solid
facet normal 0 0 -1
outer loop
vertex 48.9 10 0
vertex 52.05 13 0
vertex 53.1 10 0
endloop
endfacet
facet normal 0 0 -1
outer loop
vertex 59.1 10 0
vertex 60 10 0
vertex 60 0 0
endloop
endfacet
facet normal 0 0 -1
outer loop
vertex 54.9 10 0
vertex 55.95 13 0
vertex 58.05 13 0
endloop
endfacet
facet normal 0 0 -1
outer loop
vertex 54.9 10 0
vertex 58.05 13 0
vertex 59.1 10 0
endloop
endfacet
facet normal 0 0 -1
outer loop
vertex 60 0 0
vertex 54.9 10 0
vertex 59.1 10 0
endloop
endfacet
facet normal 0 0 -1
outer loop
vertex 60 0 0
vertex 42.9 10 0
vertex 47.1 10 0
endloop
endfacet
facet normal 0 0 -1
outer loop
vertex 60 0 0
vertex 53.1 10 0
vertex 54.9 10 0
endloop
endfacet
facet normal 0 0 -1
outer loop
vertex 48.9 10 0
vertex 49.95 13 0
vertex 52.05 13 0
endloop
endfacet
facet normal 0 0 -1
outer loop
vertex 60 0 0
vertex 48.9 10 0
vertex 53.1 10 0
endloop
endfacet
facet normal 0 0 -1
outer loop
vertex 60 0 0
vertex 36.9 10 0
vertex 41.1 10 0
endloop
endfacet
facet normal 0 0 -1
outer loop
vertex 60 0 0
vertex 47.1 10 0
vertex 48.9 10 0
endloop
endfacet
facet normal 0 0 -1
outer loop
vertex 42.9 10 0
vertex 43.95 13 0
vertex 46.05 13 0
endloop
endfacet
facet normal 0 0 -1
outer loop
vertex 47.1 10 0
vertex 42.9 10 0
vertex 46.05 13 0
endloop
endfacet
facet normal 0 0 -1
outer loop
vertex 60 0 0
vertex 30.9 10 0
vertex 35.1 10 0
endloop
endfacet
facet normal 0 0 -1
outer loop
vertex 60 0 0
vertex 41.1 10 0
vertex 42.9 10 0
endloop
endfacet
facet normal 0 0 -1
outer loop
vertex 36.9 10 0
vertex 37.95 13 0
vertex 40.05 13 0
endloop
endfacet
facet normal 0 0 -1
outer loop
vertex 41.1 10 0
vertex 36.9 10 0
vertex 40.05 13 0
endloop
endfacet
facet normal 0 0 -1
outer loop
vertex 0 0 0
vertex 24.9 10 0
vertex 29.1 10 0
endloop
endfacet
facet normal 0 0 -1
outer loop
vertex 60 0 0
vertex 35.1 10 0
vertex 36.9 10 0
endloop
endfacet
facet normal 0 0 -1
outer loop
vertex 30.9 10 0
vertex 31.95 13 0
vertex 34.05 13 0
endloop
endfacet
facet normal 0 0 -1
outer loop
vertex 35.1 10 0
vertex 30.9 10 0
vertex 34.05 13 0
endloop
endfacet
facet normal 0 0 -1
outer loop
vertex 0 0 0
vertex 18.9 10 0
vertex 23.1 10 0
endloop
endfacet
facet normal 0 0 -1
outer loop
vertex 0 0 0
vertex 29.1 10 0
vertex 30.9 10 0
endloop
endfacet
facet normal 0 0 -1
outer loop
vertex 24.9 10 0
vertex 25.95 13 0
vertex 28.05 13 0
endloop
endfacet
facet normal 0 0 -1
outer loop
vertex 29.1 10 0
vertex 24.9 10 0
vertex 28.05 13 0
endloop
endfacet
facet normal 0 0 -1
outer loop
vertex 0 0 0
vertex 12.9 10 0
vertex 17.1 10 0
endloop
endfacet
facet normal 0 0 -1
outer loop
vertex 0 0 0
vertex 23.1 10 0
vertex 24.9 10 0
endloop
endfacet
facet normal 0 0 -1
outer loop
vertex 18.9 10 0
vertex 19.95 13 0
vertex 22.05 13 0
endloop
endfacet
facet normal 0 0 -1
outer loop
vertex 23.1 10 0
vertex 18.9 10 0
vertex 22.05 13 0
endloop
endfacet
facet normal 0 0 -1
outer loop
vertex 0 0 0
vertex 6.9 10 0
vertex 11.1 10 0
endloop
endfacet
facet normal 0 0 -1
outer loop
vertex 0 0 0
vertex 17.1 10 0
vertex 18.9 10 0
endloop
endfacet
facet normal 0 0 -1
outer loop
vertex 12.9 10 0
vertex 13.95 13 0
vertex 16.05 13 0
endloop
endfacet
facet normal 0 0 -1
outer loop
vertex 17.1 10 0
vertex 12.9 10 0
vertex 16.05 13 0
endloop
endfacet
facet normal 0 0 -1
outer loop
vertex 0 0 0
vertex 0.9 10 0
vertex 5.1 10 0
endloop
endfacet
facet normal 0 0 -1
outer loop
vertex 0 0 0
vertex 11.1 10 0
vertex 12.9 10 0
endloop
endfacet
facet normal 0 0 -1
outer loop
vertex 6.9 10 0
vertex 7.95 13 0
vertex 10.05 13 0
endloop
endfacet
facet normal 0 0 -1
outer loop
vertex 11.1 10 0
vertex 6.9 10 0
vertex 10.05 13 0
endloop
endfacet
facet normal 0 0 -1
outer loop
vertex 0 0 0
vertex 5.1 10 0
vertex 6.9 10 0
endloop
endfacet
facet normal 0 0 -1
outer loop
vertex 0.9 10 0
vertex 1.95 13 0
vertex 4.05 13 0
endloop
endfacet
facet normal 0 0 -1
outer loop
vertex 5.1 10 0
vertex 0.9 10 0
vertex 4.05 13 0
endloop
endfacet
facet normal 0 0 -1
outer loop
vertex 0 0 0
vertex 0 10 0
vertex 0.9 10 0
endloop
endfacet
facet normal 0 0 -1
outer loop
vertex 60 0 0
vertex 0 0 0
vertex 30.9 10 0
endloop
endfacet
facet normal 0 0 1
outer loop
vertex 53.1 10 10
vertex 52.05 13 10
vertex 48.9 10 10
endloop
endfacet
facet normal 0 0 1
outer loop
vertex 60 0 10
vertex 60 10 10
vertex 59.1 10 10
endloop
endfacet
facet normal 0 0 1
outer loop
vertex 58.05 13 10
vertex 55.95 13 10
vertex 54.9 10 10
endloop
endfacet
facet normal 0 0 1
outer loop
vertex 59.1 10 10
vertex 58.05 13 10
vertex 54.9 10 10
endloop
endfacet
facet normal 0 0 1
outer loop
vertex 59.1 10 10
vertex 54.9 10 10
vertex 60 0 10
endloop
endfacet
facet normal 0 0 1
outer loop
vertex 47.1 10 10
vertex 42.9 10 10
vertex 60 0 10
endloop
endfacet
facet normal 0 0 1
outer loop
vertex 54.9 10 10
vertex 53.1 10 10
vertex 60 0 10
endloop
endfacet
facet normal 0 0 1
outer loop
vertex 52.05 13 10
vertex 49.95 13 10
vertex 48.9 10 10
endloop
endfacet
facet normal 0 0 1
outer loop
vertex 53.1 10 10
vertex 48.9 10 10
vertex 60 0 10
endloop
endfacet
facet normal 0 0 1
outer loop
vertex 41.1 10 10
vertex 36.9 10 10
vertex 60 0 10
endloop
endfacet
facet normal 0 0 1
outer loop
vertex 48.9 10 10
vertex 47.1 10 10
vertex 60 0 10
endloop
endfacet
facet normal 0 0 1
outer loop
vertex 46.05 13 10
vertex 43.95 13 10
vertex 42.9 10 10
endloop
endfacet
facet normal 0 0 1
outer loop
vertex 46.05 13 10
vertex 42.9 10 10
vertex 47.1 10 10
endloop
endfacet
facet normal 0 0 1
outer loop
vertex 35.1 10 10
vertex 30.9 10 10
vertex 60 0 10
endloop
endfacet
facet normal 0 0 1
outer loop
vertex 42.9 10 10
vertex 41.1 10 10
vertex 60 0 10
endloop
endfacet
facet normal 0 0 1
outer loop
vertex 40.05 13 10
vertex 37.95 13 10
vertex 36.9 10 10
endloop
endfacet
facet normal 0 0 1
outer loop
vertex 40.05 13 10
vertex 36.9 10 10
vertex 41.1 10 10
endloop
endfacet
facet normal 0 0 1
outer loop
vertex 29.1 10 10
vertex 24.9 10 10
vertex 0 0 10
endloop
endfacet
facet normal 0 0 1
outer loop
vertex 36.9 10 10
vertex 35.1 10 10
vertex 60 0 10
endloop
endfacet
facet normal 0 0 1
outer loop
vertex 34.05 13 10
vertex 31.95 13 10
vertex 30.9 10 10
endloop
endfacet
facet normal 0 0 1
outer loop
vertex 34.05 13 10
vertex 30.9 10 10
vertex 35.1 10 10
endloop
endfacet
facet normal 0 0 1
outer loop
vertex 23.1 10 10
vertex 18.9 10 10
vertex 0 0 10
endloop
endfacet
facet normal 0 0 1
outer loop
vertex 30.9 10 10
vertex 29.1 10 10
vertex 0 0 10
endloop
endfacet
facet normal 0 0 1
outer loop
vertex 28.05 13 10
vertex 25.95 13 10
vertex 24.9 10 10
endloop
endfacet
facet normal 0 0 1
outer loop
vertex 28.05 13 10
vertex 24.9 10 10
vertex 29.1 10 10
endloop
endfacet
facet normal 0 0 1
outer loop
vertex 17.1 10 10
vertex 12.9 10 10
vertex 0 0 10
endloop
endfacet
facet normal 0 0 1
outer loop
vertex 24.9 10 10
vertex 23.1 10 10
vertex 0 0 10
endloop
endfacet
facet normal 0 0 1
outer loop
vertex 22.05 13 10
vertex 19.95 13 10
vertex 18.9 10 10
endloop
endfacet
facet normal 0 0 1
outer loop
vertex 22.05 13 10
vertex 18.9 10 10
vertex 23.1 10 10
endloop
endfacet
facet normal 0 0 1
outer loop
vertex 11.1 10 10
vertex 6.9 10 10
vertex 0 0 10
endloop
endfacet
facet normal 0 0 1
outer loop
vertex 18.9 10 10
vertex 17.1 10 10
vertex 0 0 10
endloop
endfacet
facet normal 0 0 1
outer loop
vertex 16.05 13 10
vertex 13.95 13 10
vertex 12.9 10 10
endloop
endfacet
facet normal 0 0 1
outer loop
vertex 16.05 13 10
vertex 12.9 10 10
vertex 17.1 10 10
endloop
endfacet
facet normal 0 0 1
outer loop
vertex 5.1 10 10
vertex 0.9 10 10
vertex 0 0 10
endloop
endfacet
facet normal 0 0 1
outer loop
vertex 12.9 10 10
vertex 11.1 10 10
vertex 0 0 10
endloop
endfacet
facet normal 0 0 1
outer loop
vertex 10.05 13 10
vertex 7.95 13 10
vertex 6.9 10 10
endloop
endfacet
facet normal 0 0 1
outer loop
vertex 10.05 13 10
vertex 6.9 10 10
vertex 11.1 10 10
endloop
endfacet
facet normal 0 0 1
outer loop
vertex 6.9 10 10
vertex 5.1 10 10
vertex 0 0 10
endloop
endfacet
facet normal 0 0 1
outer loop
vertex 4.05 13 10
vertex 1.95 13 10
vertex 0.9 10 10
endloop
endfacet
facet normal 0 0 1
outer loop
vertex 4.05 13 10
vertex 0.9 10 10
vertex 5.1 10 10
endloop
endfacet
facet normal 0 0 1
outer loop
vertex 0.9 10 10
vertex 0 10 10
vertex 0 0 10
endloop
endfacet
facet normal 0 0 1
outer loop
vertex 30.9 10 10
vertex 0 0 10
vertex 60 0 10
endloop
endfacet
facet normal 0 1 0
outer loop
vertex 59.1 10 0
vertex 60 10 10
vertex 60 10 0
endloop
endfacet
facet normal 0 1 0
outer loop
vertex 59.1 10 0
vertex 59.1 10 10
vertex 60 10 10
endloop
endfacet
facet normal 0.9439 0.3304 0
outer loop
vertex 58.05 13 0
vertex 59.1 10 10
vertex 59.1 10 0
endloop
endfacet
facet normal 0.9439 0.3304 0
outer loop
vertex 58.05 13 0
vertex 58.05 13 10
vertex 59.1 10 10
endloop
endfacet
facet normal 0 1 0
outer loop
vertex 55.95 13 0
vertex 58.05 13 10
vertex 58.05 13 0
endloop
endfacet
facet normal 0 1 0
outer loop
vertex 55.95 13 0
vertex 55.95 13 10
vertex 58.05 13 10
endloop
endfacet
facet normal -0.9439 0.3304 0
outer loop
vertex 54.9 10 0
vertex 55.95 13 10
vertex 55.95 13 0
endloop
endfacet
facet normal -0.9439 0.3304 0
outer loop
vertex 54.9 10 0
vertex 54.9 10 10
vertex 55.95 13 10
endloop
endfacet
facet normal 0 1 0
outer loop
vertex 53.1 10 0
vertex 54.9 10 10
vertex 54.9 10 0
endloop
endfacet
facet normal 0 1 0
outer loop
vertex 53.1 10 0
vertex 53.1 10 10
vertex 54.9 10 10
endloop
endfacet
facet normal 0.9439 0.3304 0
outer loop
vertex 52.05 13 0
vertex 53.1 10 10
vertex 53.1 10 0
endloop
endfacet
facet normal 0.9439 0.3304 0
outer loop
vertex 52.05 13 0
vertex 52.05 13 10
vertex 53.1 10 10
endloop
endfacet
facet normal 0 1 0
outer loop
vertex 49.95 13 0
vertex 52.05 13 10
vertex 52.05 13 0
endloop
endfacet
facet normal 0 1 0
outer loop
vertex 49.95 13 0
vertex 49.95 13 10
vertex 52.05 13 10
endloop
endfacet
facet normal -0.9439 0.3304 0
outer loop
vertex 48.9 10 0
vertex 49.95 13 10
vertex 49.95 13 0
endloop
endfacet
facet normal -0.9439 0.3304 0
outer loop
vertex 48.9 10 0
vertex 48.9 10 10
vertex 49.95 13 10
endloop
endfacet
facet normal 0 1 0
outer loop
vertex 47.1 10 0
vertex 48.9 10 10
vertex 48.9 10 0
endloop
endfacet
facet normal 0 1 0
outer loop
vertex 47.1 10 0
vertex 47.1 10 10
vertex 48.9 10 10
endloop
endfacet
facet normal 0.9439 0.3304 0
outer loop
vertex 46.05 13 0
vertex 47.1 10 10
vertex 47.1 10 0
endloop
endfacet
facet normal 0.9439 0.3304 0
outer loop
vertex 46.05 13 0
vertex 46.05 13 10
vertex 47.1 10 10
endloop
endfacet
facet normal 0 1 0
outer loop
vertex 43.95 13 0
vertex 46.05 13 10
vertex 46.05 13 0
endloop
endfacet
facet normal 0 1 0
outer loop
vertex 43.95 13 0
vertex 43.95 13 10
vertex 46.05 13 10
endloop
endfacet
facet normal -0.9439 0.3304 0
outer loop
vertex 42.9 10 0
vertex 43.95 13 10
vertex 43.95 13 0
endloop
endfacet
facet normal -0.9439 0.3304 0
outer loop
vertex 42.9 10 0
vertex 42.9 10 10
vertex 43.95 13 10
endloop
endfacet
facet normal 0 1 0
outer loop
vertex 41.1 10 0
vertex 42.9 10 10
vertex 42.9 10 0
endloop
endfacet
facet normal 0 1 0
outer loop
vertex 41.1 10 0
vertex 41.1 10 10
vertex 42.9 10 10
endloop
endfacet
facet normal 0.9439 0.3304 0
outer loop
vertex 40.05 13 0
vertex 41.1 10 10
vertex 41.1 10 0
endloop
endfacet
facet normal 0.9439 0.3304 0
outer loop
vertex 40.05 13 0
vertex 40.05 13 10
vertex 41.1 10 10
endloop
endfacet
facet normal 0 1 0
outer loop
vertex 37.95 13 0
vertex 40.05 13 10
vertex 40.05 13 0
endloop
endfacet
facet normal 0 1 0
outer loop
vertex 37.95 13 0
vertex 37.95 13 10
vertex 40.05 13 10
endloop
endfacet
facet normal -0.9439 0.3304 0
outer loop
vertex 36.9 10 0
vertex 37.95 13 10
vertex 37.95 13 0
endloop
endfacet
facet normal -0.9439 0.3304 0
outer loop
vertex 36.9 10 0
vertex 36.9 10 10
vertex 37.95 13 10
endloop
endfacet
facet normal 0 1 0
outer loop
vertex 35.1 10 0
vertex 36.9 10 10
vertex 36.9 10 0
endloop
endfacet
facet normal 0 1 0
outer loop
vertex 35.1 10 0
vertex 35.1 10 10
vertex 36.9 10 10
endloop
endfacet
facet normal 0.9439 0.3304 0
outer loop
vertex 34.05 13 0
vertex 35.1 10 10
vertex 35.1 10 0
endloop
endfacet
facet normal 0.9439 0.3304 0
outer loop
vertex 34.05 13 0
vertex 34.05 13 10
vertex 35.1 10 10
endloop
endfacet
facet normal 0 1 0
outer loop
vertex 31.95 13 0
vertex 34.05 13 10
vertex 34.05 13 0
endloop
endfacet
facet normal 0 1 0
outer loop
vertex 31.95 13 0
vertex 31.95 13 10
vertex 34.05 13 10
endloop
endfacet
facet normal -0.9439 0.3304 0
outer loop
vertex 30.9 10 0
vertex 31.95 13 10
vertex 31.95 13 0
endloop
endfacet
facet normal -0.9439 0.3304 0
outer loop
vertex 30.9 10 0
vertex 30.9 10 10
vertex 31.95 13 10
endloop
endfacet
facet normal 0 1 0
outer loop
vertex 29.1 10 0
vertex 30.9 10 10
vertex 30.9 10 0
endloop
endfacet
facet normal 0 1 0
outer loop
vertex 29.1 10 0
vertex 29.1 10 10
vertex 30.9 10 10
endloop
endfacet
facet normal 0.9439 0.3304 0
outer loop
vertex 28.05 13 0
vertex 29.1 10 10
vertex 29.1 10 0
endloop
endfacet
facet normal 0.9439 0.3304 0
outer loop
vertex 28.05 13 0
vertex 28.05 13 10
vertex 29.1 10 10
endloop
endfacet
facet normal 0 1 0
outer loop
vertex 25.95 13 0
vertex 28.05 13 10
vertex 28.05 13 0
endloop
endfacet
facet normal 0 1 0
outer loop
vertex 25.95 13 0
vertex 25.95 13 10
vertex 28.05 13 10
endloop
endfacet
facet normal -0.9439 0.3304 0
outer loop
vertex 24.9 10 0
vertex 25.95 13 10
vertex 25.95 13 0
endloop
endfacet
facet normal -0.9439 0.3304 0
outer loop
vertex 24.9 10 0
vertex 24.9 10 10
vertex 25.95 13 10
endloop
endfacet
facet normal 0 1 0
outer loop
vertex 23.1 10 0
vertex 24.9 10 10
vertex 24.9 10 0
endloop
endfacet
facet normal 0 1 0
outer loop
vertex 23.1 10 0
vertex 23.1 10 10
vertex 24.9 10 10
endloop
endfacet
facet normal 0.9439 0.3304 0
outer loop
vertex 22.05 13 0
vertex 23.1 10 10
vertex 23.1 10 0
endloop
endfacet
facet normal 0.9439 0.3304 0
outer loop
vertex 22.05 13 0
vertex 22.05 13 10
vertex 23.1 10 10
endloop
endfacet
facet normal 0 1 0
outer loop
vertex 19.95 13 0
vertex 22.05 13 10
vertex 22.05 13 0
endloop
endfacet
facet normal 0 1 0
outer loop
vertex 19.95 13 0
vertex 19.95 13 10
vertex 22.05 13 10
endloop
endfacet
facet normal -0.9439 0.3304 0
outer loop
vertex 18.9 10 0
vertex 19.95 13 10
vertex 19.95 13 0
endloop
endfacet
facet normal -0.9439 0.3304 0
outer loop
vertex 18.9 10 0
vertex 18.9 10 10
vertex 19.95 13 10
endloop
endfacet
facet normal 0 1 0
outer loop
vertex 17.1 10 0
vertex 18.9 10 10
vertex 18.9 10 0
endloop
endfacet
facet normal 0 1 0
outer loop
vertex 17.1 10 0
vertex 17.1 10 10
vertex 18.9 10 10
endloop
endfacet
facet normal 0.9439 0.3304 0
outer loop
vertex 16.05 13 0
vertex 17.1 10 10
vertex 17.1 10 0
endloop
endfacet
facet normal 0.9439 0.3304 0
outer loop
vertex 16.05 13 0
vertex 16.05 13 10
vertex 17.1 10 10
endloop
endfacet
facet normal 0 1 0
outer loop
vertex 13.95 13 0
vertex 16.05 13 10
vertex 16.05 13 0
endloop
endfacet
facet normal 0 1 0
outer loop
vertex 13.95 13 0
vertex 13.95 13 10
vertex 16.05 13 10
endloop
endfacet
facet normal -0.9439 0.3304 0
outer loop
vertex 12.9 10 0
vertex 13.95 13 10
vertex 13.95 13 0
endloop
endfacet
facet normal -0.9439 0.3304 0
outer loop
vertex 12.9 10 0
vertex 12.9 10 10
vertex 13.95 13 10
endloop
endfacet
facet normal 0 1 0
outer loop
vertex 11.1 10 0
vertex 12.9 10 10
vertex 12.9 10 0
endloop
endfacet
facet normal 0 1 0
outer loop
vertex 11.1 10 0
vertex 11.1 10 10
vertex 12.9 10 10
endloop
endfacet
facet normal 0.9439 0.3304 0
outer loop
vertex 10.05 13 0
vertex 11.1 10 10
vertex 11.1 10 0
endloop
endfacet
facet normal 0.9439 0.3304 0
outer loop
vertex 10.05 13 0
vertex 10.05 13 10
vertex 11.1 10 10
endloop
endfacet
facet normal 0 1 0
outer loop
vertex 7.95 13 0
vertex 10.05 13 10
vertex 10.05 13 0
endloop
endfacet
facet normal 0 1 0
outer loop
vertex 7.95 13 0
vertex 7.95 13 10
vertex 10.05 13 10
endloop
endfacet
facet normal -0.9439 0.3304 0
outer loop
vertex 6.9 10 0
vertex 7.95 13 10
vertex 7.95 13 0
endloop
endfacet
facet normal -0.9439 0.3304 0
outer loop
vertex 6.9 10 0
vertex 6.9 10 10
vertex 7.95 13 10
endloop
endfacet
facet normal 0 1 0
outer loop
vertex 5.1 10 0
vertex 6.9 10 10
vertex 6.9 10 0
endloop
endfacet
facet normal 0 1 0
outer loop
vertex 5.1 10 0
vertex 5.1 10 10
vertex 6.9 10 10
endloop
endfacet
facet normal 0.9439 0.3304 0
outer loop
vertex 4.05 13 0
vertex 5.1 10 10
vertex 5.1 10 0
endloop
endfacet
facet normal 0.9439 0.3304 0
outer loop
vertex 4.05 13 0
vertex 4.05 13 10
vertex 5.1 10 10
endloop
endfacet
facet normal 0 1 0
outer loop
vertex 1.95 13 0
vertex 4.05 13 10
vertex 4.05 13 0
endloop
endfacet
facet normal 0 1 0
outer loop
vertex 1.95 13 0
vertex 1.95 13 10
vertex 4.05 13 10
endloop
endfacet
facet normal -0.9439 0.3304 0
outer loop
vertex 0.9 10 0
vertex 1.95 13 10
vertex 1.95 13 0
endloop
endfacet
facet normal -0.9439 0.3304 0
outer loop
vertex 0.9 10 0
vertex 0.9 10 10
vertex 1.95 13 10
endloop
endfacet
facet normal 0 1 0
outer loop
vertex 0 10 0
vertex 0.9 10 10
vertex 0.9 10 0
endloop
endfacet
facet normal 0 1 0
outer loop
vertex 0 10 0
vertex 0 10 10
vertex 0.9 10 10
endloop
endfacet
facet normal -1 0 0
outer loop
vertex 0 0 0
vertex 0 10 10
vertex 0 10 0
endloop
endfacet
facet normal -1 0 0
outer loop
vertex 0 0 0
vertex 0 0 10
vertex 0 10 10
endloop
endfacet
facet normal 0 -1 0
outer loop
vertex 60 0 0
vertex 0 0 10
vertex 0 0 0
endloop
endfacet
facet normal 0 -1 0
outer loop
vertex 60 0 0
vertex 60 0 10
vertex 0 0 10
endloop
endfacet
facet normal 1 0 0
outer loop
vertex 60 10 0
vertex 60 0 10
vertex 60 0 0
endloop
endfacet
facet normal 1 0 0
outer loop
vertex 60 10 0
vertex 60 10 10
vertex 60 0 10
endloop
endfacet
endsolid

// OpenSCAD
$fn = 32;

// ----------------------------------------------------------------------
// Gear rack: 10 teeth, pitch 6 mm
// ----------------------------------------------------------------------

// --- parameters (mm) ---
teeth = 10;               // number of teeth
pitch = 6;                // tooth pitch, X
root_w = 4.2;             // tooth width at the root
tip_w = 2.1;              // tooth width at the tip
base_h = 10;              // rack body height, Y
tooth_h = 3;              // tooth height above the body
plate_t = 10;             // rack width, Z (extrusion height)
fit_tol = 0.1;            // declared fit tolerance (prompt contract)
free_tol = 0.3;           // declared free tolerance (prompt contract)

rack_l = teeth * pitch;  // overall length
total_h = base_h + tooth_h;  // overall height

profile = [[0, 0], [60, 0], [60, 10], [59.1, 10], [58.05, 13], [55.95, 13], [54.9, 10], [53.1, 10], [52.05, 13], [49.95, 13], [48.9, 10], [47.1, 10], [46.05, 13], [43.95, 13], [42.9, 10], [41.1, 10], [40.05, 13], [37.95, 13], [36.9, 10], [35.1, 10], [34.05, 13], [31.95, 13], [30.9, 10], [29.1, 10], [28.05, 13], [25.95, 13], [24.9, 10], [23.1, 10], [22.05, 13], [19.95, 13], [18.9, 10], [17.1, 10], [16.05, 13], [13.95, 13], [12.9, 10], [11.1, 10], [10.05, 13], [7.95, 13], [6.9, 10], [5.1, 10], [4.05, 13], [1.95, 13], [0.9, 10], [0, 10]];  // primary outline, 44 points, counter clockwise

// --- the one profile operation ---
linear_extrude(height = plate_t) polygon(points = profile);
